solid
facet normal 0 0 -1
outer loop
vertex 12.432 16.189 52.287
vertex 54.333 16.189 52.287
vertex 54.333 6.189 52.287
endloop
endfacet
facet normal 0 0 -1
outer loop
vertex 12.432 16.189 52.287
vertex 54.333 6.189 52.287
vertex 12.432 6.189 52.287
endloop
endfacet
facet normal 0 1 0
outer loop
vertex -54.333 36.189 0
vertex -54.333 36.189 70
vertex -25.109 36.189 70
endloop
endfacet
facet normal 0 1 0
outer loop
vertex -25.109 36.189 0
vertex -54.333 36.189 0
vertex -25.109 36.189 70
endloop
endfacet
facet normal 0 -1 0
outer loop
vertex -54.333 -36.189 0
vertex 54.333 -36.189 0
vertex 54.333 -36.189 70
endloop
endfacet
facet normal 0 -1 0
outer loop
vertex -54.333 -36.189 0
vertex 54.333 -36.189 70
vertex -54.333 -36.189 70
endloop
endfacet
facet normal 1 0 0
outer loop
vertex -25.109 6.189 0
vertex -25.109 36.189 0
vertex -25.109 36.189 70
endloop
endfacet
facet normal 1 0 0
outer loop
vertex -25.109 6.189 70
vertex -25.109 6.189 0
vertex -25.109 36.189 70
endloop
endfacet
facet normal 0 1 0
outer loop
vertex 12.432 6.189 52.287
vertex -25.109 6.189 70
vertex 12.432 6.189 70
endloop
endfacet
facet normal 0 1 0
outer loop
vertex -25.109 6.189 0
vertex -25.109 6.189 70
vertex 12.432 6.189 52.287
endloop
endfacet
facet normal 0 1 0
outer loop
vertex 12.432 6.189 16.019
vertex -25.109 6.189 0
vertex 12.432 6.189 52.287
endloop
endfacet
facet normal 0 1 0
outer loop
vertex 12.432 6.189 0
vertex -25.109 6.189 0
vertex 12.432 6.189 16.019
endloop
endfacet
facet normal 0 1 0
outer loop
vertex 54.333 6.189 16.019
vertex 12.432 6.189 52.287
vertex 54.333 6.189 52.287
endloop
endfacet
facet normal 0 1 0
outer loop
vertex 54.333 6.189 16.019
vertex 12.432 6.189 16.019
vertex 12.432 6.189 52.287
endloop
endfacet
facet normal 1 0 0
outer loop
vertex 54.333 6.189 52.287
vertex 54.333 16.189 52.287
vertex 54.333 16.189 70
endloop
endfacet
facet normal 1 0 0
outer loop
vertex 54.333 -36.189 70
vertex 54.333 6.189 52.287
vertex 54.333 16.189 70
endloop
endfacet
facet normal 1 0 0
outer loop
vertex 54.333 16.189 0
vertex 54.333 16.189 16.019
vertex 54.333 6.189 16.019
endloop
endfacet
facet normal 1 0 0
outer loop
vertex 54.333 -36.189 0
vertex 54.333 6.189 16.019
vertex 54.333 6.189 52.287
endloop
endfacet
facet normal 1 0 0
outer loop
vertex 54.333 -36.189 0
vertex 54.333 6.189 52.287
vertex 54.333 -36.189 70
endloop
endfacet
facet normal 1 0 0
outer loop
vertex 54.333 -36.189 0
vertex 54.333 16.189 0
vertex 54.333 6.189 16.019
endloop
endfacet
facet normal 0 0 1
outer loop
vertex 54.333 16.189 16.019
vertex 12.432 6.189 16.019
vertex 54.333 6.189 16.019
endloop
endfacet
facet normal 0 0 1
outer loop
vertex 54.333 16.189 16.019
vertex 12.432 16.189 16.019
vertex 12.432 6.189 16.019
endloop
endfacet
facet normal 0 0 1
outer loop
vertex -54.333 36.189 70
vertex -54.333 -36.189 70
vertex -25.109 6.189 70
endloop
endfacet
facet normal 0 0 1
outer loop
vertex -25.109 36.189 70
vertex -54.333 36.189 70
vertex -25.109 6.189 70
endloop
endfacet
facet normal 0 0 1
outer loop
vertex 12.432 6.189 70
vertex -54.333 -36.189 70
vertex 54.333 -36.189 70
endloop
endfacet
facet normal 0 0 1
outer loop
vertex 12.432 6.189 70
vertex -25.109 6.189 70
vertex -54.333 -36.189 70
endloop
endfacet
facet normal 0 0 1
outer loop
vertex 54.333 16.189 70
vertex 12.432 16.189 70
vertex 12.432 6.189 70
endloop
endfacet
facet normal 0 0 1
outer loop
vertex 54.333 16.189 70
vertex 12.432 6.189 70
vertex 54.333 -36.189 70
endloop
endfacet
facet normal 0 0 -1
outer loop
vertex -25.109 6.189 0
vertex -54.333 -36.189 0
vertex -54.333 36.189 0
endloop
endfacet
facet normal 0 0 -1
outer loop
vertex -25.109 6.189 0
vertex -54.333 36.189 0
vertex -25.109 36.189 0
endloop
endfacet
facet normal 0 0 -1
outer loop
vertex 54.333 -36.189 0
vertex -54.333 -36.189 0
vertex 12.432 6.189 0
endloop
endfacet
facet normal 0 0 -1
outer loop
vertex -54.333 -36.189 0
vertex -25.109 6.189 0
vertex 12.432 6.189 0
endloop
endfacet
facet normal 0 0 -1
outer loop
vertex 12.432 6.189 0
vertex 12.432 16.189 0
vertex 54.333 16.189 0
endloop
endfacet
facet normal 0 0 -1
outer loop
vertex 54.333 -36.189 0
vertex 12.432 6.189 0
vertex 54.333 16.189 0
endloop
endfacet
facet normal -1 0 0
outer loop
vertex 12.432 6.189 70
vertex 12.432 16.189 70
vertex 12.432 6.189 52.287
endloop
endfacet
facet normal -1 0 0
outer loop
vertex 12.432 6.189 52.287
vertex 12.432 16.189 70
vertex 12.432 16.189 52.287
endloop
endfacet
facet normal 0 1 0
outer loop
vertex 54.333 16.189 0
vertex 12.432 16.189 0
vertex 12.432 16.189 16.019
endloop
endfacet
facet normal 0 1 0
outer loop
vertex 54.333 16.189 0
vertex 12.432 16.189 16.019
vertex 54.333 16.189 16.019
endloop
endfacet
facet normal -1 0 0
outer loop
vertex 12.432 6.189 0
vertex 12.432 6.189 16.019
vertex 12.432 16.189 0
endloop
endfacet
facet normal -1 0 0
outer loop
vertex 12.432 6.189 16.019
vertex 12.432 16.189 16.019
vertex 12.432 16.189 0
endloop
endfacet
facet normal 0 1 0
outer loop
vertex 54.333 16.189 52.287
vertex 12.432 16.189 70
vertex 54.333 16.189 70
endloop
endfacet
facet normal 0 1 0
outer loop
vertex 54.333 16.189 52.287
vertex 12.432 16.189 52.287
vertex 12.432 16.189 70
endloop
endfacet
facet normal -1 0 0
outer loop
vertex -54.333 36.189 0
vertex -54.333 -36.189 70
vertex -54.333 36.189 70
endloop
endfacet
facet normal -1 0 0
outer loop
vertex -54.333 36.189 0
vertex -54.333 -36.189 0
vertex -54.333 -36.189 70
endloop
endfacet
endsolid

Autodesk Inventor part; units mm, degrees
ref_plane "YZ Plane" through (0, 0, 0) normal (1, 0, 0) x (0, 1, 0)
ref_plane "XZ Plane" through (0, 0, 0) normal (0, 1, 0) x (-1, 0, 0)
ref_plane "XY Plane" through (0, 0, 0) normal (0, 0, 1) x (1, 0, 0)
sketch "스케치1" plane through (0, 0, 0) normal (0, 0, 1) x (1, 0, 0)
  line L0 (54.3328, -36.1894) -> (-54.3328, -36.1894)
  line L1 (-54.3328, -36.1894) -> (-54.3328, 36.1894)
  line L2 (-54.3328, 36.1894) -> (54.3328, 36.1894)
  line L3 (54.3328, 36.1894) -> (54.3328, -36.1894)
  line L4 (54.3328, -36.1894) -> (-54.3328, 36.1894) construction
  line L5 (-54.3328, -36.1894) -> (54.3328, 36.1894) construction
  point P0 (0, 0)
extrude "돌출1" add sketch "스케치1" along normal blind 70
sketch "스케치2" plane through (-54.3328, 36.1894, 0) normal (0, 1, 0) x (1, 0, 0)
  line L0 (0, -70) -> (108.6655, -70) projected
  line L1 (108.6655, 0) -> (0, 0) projected
  line L2 (29.224, -70) -> (66.7649, -70)
  line L3 (66.7649, -70) -> (66.7649, 0)
  line L4 (66.7649, 0) -> (29.224, 0)
  line L5 (29.224, 0) -> (29.224, -70)
  line L6 (66.7649, -52.0222) -> (98.3413, -52.0222)
  line L7 (98.3413, -52.0222) -> (98.3413, -16.2356)
  line L8 (98.3413, -16.2356) -> (66.7649, -16.2356)
  line L9 (66.7649, -16.2356) -> (66.7649, -52.0222)
  point P0 (54.3328, 0)
extrude "돌출2" cut sketch "스케치2" against normal blind 30 contours L5 L1 L3 L0
sketch "스케치3" plane through (54.3328, 36.1894, 70) normal (0, 1, 0) x (1, 0, 0)
  line L0 (-41.9007, 70) -> (-41.9007, 0) projected
  line L1 (0, 70) -> (0, 0) projected
  line L2 (-41.9007, 53.9806) -> (0, 53.9806)
  line L3 (0, 53.9806) -> (0, 17.7133)
  line L4 (0, 17.7133) -> (-41.9007, 17.7133)
  line L5 (-41.9007, 17.7133) -> (-41.9007, 53.9806)
  point P0 (-54.3328, 70)
extrude "돌출3" cut sketch "스케치3" against normal blind 30
sketch "스케치4" plane through (0, 0, 70) normal (0, 0, 1) x (1, 0, 0)
  point P0 (0, 0)
sketch "스케치5" plane through (12.4321, 36.1894, 0) normal (0, 1, 0) x (1, 0, 0)
  line L0 (41.9007, 0) -> (41.9007, -16.0194) projected
  line L1 (0, 0) -> (41.9007, 0)
  line L2 (41.9007, 0) -> (41.9007, -16.0194)
  line L3 (41.9007, -16.0194) -> (0, -16.0194)
  line L4 (0, -16.0194) -> (0, 0)
  line L5 (41.9007, -70) -> (0, -70) projected
  line L6 (0, -52.2867) -> (41.9007, -52.2867)
  line L7 (41.9007, -52.2867) -> (41.9007, -70)
  line L8 (41.9007, -70) -> (0, -70)
  line L9 (0, -70) -> (0, -52.2867)
  point P0 (-12.4321, 0)
extrude "돌출4" cut sketch "스케치5" against normal blind 20 contours L0 L3 L4 L1
extrude "돌출5" cut sketch "스케치5" against normal blind 20 contours L5 L9 L6 L7
properties part number "240503_3Dsketch06"
